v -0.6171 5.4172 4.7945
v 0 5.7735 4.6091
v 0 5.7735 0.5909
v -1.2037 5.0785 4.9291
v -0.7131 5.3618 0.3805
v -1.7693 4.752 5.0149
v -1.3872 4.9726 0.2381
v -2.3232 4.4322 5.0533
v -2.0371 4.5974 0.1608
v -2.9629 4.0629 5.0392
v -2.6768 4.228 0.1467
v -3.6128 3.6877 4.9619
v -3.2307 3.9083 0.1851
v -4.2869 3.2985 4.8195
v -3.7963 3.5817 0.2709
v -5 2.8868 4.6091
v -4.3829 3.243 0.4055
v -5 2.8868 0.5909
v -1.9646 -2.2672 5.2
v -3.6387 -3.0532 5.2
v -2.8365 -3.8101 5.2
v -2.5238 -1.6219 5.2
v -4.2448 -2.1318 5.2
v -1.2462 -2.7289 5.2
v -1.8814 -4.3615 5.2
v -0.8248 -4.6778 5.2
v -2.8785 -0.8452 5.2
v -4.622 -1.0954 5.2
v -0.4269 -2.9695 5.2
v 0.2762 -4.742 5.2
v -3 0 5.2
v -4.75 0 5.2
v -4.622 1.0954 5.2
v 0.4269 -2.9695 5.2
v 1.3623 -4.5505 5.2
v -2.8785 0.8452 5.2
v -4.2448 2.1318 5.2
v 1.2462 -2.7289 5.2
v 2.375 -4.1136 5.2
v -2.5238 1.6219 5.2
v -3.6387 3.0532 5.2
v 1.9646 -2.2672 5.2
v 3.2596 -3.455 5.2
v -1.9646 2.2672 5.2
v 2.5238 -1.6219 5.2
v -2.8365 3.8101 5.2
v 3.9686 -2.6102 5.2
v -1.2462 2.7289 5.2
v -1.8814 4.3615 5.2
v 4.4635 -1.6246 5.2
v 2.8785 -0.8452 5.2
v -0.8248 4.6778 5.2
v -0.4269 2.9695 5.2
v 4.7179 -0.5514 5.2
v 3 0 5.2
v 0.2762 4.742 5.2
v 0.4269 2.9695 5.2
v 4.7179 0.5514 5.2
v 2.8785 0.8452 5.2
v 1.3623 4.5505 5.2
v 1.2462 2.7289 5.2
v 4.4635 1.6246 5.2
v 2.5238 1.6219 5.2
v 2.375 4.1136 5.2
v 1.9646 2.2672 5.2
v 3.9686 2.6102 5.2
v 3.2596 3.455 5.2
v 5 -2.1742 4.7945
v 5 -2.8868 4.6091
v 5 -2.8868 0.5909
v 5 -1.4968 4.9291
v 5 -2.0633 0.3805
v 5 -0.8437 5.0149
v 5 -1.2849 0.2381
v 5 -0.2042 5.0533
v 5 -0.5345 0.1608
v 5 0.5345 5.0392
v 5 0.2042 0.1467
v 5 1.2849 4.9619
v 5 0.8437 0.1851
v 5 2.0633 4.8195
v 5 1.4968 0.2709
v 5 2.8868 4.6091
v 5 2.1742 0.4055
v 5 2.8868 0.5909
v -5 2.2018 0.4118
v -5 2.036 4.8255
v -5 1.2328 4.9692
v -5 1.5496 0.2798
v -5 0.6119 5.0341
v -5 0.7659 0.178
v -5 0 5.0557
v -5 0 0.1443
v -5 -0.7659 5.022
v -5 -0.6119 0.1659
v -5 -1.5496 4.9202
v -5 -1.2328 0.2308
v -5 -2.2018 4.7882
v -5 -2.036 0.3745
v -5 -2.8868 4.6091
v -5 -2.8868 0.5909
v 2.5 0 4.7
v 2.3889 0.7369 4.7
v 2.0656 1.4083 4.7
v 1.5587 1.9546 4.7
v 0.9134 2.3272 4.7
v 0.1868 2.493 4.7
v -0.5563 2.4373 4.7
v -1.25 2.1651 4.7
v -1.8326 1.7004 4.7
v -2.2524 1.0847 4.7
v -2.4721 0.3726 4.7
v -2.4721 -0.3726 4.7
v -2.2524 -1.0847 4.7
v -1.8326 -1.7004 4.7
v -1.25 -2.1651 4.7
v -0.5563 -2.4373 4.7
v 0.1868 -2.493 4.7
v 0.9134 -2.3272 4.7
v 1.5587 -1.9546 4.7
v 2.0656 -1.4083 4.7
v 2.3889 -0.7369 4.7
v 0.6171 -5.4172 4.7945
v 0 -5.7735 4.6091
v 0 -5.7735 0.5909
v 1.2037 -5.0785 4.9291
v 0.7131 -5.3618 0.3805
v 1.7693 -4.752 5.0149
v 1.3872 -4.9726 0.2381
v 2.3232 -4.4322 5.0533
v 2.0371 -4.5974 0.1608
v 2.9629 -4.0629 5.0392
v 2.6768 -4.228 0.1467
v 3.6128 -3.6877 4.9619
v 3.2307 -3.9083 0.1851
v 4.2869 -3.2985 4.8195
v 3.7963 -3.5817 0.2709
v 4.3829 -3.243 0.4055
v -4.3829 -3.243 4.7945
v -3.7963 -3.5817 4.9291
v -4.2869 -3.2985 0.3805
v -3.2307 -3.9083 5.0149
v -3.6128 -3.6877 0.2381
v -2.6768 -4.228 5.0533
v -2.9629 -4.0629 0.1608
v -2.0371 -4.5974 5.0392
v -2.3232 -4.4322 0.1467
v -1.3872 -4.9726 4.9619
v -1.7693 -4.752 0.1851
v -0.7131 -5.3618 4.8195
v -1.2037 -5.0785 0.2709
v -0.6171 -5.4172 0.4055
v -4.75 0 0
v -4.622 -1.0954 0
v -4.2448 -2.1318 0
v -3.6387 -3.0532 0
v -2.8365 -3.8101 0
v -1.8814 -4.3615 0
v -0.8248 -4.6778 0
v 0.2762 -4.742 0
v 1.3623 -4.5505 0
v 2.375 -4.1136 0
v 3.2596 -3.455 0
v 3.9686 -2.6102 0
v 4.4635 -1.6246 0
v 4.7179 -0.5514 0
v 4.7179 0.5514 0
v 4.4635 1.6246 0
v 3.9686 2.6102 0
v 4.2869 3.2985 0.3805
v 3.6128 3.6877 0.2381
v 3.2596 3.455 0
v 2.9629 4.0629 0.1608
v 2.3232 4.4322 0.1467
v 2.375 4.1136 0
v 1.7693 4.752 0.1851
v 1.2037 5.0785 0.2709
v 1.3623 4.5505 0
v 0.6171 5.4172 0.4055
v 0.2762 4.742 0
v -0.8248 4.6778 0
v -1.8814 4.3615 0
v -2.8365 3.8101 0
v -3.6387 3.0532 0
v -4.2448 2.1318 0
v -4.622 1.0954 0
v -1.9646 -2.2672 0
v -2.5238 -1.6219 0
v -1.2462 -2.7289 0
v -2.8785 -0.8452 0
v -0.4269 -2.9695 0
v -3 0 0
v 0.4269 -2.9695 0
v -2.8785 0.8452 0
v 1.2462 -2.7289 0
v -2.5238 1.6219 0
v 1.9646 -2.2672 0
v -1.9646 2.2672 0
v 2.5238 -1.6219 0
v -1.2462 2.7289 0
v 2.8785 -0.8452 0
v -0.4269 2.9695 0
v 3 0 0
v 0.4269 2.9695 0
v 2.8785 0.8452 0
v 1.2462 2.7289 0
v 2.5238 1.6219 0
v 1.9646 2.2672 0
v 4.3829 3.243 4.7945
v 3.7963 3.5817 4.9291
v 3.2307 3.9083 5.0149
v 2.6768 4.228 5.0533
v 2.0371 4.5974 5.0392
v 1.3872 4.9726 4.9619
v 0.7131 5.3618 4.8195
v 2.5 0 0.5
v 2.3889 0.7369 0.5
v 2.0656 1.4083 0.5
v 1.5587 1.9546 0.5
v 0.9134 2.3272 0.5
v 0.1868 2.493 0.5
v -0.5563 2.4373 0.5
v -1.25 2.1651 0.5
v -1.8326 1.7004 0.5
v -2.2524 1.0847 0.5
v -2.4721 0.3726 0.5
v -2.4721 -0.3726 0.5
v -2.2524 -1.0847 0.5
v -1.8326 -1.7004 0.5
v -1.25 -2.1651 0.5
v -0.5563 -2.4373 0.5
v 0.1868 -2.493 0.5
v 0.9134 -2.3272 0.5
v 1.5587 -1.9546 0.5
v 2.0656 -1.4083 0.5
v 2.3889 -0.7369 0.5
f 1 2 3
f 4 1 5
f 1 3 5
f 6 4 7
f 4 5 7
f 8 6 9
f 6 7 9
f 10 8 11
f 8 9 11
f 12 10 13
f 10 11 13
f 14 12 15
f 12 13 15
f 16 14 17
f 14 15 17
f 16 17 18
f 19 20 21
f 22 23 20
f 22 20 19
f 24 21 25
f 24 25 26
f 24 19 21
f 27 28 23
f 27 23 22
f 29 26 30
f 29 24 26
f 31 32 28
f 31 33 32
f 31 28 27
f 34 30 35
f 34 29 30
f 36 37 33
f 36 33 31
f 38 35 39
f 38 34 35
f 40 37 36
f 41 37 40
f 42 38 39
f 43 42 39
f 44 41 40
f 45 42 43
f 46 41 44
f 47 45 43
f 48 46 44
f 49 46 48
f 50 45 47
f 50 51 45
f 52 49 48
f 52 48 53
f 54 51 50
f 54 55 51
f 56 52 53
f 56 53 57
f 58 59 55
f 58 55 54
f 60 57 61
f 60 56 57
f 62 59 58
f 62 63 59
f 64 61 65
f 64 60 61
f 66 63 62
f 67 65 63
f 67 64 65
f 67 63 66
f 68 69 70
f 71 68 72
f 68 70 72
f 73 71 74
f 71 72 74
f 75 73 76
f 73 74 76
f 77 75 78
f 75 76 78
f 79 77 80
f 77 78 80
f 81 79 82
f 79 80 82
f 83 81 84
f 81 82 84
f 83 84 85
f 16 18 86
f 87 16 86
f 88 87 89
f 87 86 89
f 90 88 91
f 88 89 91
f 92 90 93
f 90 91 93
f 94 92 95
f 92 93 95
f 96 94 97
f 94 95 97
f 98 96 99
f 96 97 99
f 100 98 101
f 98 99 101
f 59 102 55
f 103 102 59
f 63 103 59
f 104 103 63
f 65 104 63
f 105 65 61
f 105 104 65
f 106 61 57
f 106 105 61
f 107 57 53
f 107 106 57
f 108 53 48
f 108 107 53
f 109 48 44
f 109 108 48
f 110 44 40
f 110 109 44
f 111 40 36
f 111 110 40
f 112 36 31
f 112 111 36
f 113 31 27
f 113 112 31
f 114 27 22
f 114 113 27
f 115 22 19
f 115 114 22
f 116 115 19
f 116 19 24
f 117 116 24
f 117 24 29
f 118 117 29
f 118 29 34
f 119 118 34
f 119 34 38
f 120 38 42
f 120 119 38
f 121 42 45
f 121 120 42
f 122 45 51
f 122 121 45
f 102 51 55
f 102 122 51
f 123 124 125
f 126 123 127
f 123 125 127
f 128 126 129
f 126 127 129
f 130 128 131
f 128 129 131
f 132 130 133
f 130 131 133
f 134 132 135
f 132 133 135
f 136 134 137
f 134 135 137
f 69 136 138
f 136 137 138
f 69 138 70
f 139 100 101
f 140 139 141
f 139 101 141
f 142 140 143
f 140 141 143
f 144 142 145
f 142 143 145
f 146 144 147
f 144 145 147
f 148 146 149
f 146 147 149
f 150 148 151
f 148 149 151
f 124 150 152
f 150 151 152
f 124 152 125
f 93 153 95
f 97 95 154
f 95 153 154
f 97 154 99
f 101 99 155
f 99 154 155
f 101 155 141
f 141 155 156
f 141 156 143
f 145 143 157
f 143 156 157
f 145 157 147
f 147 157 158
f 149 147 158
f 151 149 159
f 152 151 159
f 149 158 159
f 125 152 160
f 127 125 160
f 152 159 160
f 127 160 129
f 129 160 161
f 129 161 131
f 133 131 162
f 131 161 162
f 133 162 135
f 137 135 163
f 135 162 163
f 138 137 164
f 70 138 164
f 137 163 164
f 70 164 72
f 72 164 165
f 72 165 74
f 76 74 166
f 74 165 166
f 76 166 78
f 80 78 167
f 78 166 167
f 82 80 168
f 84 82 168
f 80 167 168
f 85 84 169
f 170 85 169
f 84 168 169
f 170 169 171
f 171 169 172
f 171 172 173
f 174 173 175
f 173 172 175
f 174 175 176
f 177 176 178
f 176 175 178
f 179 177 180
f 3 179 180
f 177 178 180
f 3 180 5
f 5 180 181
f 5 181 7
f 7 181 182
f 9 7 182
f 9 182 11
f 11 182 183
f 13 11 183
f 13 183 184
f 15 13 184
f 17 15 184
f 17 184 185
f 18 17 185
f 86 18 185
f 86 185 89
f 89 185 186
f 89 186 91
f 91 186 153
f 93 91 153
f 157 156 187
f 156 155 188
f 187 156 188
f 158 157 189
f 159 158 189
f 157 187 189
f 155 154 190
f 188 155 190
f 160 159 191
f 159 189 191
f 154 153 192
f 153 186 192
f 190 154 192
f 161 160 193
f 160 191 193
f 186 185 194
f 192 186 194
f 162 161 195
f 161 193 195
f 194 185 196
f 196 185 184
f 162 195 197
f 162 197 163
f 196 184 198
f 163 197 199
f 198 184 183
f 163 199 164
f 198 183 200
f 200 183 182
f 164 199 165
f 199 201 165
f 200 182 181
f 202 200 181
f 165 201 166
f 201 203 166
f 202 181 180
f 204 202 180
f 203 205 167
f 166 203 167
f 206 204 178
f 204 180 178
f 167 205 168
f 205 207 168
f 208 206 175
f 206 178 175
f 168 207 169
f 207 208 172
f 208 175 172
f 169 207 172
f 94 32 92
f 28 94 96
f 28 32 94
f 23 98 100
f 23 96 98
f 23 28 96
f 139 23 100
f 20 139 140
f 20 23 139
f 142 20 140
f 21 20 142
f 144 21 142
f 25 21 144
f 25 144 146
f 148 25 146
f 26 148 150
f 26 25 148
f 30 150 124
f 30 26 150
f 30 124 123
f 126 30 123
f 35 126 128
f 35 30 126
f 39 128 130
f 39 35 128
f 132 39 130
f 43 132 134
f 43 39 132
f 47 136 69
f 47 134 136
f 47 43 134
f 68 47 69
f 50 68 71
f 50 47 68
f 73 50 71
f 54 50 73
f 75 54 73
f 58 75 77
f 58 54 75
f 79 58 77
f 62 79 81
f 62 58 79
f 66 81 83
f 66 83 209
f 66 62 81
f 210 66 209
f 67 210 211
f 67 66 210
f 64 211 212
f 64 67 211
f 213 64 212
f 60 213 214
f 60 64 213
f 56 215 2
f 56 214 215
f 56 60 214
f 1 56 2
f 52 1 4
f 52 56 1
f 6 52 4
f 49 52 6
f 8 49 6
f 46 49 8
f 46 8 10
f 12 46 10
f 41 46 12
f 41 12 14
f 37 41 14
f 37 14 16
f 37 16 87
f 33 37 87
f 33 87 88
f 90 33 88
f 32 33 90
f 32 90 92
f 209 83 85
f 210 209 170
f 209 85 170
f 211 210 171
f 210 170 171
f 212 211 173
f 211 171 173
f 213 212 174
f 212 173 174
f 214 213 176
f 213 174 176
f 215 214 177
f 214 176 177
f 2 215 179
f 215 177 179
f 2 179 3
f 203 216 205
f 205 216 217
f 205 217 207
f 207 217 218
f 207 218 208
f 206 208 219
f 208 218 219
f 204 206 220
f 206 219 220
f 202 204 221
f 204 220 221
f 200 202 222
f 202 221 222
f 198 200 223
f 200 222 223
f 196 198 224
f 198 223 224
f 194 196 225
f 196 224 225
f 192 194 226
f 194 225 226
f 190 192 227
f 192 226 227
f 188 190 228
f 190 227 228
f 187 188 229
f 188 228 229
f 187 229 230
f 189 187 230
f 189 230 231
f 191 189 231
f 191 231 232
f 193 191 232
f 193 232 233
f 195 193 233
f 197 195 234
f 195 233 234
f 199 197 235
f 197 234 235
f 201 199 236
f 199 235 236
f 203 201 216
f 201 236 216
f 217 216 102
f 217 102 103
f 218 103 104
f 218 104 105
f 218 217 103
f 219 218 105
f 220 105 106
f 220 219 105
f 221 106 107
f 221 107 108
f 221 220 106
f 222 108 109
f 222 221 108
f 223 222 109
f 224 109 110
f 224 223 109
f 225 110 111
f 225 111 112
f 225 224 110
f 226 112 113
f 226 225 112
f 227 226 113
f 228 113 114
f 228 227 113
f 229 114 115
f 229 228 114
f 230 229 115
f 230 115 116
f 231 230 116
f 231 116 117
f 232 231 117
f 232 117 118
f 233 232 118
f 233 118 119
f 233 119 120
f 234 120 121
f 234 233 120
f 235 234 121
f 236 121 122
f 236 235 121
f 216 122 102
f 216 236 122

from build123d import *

# Parameters (mm, degrees)
SKETCH_1_R      = 2.5
EXTRUDE_1_DEPTH = 5.2
CHAMFER_1_SIZE  = 0.5


with BuildPart() as part:
    # Эскиз1 → Бобышка-Вытянуть1 (new body)
    with BuildSketch(Plane.XY):
        Polygon((0, 5.773502692), (-5, 2.886751346), (-5, -2.886751346), (0, -5.773502692), (5, -2.886751346), (5, 2.886751346), align=None)
        Circle(SKETCH_1_R, mode=Mode.SUBTRACT)
    extrude(amount=EXTRUDE_1_DEPTH)

    # Эскиз2 → Вырез-Повернуть1 (revolve, cut)
    with BuildSketch(Plane(origin=(0, 0, 0), x_dir=(0, 0, -1), z_dir=(1, 0, 0)), mode=Mode.PRIVATE) as cut_revolve_1_sk:
        Polygon((0, 5.773502692), (-0.590919555, 5.773502692), (0, 4.75), align=None)
        Polygon((-5.2, 4.75), (-5.2, 5.773502692), (-4.609080445, 5.773502692), align=None)
    revolve(cut_revolve_1_sk.sketch.rotate(Axis((0, 0, 0), (0, 0, 1)), 90), axis=Axis((0, 0, 0), (0, 0, 1)), mode=Mode.SUBTRACT)

    # Фаска1
    chamfer_1_edges = [part.edges().sort_by_distance(p)[0] for p in [
        (-2.5, 0, 0),
        (-2.5, 0, 5.2),
    ]]
    chamfer(chamfer_1_edges, length=CHAMFER_1_SIZE)


solid = part.part
